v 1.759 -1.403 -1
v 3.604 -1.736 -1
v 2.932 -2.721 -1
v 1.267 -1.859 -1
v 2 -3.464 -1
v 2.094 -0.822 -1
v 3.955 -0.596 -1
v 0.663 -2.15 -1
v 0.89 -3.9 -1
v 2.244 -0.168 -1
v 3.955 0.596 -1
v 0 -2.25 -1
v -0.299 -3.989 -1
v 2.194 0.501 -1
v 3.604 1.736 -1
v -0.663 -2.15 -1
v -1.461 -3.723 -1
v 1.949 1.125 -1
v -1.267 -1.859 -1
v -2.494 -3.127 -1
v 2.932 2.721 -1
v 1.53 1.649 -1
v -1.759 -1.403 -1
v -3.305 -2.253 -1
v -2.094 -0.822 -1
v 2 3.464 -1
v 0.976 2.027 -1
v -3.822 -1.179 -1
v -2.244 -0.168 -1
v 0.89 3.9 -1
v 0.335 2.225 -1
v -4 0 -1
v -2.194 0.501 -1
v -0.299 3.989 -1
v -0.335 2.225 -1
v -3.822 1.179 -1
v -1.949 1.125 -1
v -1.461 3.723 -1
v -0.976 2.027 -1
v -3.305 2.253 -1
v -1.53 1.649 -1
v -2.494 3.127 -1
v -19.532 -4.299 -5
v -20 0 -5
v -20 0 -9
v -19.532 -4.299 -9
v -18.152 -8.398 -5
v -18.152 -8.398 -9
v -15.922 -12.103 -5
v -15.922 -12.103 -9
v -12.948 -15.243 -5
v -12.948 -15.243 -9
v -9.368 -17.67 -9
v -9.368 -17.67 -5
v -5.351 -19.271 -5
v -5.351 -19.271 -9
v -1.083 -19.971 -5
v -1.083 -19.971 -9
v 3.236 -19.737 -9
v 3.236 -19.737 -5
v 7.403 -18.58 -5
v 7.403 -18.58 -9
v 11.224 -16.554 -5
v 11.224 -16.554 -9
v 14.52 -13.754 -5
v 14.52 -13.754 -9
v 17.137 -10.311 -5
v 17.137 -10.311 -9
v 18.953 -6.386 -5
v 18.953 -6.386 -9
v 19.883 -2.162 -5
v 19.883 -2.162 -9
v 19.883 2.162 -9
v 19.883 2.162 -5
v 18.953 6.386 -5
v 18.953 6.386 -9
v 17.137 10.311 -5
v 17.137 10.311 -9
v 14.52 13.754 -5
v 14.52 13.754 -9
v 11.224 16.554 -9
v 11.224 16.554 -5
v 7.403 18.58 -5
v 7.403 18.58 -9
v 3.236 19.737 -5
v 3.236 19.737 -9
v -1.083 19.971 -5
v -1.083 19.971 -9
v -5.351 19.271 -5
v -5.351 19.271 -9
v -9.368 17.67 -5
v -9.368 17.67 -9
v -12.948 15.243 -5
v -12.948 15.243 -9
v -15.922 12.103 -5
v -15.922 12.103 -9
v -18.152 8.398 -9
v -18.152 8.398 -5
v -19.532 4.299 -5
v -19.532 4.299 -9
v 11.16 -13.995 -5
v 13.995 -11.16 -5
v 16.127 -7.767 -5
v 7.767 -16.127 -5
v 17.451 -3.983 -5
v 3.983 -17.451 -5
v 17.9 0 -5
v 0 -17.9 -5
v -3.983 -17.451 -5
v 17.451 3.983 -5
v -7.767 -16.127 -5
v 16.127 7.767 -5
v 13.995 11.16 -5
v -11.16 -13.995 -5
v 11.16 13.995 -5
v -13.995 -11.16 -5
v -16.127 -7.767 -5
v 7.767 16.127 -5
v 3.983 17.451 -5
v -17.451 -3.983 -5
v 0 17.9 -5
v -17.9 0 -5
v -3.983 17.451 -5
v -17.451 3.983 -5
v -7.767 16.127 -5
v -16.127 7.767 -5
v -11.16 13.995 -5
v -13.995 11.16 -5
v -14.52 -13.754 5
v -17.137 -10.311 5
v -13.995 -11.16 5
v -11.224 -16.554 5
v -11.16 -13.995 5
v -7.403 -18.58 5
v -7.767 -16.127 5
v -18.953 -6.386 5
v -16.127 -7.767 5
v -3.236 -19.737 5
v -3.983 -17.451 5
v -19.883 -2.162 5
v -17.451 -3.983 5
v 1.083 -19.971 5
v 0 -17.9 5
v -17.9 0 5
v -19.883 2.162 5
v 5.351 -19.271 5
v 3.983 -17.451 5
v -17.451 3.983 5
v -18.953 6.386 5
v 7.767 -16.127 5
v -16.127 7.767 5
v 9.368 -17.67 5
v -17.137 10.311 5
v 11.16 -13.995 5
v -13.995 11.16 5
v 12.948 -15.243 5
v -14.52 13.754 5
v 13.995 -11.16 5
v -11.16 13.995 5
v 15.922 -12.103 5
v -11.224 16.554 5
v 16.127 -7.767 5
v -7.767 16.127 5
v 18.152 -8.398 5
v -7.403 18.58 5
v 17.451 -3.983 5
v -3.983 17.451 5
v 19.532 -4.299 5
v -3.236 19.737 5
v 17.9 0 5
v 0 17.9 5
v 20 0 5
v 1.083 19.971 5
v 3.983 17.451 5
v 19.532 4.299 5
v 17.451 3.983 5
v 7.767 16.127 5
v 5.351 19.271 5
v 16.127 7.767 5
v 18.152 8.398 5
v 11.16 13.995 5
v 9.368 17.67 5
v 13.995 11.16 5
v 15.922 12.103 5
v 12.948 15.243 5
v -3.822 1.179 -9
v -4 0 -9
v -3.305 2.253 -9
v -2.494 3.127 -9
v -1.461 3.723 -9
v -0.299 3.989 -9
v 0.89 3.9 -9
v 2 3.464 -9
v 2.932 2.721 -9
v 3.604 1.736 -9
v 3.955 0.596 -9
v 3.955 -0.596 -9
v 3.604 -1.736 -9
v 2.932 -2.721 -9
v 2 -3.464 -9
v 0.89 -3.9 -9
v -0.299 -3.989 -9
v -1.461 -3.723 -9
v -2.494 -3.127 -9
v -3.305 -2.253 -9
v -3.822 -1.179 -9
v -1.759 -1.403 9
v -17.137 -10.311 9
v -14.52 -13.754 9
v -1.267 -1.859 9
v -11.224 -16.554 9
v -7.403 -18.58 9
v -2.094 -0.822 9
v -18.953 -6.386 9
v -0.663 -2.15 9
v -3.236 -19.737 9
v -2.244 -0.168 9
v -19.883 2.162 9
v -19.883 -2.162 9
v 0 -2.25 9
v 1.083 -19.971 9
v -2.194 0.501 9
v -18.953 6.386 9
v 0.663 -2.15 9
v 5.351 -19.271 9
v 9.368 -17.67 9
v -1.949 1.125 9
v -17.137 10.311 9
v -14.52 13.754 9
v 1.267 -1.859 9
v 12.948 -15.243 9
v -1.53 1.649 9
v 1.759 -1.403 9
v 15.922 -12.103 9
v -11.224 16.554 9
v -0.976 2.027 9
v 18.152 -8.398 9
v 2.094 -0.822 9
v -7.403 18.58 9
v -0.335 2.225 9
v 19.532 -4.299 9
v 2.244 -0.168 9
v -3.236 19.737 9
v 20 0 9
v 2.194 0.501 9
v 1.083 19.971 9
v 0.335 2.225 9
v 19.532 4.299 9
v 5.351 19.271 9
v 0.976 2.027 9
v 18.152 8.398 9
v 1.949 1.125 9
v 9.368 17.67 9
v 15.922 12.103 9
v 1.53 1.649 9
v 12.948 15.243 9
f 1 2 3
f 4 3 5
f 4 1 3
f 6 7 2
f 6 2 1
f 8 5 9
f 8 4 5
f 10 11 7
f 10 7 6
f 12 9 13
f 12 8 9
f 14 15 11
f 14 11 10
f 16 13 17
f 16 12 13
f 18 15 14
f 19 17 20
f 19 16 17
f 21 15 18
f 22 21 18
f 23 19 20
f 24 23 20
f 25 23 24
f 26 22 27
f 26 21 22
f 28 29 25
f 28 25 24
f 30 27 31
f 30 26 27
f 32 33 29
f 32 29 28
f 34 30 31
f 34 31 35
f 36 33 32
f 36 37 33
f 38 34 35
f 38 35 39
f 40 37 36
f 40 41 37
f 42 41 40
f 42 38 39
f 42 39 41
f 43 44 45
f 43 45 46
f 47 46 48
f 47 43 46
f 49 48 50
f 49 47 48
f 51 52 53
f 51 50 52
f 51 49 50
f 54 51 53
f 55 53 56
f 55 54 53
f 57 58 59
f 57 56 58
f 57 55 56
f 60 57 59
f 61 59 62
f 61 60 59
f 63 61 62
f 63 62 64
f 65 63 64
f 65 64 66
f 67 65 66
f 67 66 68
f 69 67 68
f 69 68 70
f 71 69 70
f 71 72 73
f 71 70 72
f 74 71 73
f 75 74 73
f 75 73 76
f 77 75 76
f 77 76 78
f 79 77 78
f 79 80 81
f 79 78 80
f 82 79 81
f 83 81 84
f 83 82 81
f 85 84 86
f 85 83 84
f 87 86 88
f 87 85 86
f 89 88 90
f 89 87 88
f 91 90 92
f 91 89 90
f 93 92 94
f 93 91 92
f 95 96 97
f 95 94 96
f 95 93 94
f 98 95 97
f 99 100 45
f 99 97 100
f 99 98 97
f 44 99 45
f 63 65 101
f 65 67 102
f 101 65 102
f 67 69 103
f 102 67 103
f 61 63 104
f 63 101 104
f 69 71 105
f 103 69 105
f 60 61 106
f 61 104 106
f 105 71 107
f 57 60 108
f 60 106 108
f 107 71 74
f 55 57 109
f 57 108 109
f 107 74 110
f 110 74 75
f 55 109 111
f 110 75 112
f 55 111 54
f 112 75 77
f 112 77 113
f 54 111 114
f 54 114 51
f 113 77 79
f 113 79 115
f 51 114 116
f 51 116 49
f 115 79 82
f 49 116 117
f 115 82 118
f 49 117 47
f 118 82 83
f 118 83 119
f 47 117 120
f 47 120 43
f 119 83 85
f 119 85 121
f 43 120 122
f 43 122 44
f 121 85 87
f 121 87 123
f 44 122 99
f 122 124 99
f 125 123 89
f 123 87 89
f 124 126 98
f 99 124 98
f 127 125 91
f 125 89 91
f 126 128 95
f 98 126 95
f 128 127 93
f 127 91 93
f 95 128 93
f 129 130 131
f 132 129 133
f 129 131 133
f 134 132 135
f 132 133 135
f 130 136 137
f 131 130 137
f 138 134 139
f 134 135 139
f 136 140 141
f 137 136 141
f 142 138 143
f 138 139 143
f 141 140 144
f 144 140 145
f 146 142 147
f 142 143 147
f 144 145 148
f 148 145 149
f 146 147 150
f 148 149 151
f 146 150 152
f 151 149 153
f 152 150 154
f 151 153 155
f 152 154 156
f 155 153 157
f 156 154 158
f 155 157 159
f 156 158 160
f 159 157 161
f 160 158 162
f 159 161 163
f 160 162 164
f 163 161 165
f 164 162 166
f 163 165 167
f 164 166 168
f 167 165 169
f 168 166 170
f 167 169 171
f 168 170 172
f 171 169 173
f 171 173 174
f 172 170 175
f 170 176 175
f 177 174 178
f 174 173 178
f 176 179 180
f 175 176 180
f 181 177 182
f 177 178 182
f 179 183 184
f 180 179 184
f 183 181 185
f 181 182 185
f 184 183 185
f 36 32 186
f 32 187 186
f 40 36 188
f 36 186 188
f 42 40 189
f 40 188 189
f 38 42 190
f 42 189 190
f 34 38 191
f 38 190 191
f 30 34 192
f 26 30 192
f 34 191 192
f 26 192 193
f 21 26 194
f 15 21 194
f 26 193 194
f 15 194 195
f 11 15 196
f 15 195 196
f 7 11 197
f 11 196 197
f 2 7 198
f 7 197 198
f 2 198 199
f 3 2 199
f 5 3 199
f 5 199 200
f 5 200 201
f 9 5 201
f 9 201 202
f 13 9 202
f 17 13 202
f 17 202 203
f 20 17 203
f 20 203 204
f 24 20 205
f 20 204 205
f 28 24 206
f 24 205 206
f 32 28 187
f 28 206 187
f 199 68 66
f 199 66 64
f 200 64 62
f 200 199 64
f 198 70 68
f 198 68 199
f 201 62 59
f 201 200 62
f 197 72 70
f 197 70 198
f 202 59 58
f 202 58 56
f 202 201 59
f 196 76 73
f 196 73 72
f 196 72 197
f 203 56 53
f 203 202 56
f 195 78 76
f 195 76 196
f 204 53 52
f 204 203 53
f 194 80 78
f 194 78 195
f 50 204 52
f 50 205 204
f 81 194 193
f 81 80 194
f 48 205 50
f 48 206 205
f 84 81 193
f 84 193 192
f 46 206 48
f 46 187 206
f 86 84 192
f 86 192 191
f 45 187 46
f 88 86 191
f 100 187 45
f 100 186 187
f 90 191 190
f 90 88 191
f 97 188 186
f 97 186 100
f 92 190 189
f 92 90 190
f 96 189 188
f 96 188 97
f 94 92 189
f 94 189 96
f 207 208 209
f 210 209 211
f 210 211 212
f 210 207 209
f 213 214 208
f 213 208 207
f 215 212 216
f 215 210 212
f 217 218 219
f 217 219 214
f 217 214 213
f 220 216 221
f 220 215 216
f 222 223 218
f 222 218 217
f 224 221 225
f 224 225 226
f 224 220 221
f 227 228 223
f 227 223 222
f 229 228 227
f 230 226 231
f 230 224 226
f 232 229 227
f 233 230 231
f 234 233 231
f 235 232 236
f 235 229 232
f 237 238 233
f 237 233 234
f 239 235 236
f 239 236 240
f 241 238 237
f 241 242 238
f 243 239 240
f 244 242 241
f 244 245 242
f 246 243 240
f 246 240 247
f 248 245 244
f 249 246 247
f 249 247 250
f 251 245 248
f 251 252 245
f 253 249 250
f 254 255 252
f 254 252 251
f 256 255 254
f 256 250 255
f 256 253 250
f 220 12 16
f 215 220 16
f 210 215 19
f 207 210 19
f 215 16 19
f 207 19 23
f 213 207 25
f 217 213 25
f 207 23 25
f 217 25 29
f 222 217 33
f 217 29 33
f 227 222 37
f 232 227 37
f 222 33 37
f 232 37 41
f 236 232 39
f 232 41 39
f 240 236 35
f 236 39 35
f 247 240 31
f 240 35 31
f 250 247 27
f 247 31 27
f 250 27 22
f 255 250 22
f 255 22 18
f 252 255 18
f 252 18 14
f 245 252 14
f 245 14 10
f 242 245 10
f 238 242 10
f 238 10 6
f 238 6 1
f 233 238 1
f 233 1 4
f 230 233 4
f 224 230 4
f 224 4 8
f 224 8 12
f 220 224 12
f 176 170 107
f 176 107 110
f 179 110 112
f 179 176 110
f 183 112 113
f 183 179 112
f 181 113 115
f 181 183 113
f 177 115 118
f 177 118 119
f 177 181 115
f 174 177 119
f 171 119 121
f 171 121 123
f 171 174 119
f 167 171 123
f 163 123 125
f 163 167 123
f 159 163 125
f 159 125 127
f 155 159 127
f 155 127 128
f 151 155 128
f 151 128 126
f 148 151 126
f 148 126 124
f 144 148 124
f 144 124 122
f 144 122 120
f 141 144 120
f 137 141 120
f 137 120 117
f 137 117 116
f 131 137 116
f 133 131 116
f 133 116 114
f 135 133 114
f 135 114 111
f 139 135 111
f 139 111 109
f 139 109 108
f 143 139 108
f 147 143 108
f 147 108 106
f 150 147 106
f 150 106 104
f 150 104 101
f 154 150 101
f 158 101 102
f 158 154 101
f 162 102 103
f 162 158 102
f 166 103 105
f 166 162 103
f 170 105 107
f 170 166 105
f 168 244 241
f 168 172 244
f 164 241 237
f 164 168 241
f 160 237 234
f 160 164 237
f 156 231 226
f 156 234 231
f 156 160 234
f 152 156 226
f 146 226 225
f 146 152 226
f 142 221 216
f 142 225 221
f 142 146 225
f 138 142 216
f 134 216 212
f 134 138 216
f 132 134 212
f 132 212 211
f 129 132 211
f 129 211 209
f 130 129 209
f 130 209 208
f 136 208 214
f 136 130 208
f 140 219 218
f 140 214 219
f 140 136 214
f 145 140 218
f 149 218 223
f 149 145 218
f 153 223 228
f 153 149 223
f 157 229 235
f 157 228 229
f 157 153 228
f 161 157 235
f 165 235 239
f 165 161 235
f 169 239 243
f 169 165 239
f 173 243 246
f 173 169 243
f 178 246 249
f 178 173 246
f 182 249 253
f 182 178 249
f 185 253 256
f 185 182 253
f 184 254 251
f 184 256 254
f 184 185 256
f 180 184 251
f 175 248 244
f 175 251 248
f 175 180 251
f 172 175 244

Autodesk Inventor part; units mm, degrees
ref_plane "YZ Plane" through (0, 0, 0) normal (1, 0, 0) x (0, 1, 0)
ref_plane "XZ Plane" through (0, 0, 0) normal (0, 1, 0) x (-1, 0, 0)
ref_plane "XY Plane" through (0, 0, 0) normal (0, 0, 1) x (1, 0, 0)
sketch "Pulley Sketch" plane through (0, 0, 0) normal (0, 0, 1) x (1, 0, 0)
  circle A0 centre (0, 0) radius 17.9
  dimension "d24" = 35.8
extrude "Extrusion3" add sketch "Pulley Sketch" along normal mid plane 10
sketch "Sketch2" plane through (0, 0, 5) normal (0, 0, 1) x (1, 0, 0)
  circle A0 centre (0, 0) radius 20
  dimension "d19" = 40
extrude "Extrusion4" add sketch "Sketch2" along normal blind 4
sketch "Sketch3" plane through (0, 0, -5) normal (0, 0, -1) x (-1, 0, 0)
  circle A0 centre (0, 0) radius 20 projected
extrude "Extrusion5" add sketch "Sketch3" along normal blind 4
sketch "Sketch4" plane through (0, 0, -9) normal (0, 0, -1) x (-1, 0, 0)
  circle A0 centre (0, 0) radius 4
  dimension "d37" = 8
extrude "Extrusion6" cut sketch "Sketch4" against normal blind 8
sketch "Sketch5" plane through (0, 0, 9) normal (0, 0, 1) x (1, 0, 0)
  point P0 (0, 0)
  point P1 (0, 0)
hole "Hole1" at (0, 0, 9) direction (0, 0, -1) diameter 4.5 end through all clearance for "Flat Head Machine Screw" size "M4" standard "Ansi Metric M Profile"
equation "\"da_pb\" = 5"
equation "\"da_fi\" = 25deg"
equation "\"da_hg\" = 1.25"
equation "\"da_bw\" = 1.8"
equation "\"da_rb\" = 0.4"
equation "\"da_rt\" = 0.6"
equation "\"da_a\" = 0.5"
equation "\"da_bf\" = 11.5"
equation "\"da_wf\" = 1"
equation "\"da_hf\" = 1.2"
properties part number "Synchronous Pulley2" material "Steel"
